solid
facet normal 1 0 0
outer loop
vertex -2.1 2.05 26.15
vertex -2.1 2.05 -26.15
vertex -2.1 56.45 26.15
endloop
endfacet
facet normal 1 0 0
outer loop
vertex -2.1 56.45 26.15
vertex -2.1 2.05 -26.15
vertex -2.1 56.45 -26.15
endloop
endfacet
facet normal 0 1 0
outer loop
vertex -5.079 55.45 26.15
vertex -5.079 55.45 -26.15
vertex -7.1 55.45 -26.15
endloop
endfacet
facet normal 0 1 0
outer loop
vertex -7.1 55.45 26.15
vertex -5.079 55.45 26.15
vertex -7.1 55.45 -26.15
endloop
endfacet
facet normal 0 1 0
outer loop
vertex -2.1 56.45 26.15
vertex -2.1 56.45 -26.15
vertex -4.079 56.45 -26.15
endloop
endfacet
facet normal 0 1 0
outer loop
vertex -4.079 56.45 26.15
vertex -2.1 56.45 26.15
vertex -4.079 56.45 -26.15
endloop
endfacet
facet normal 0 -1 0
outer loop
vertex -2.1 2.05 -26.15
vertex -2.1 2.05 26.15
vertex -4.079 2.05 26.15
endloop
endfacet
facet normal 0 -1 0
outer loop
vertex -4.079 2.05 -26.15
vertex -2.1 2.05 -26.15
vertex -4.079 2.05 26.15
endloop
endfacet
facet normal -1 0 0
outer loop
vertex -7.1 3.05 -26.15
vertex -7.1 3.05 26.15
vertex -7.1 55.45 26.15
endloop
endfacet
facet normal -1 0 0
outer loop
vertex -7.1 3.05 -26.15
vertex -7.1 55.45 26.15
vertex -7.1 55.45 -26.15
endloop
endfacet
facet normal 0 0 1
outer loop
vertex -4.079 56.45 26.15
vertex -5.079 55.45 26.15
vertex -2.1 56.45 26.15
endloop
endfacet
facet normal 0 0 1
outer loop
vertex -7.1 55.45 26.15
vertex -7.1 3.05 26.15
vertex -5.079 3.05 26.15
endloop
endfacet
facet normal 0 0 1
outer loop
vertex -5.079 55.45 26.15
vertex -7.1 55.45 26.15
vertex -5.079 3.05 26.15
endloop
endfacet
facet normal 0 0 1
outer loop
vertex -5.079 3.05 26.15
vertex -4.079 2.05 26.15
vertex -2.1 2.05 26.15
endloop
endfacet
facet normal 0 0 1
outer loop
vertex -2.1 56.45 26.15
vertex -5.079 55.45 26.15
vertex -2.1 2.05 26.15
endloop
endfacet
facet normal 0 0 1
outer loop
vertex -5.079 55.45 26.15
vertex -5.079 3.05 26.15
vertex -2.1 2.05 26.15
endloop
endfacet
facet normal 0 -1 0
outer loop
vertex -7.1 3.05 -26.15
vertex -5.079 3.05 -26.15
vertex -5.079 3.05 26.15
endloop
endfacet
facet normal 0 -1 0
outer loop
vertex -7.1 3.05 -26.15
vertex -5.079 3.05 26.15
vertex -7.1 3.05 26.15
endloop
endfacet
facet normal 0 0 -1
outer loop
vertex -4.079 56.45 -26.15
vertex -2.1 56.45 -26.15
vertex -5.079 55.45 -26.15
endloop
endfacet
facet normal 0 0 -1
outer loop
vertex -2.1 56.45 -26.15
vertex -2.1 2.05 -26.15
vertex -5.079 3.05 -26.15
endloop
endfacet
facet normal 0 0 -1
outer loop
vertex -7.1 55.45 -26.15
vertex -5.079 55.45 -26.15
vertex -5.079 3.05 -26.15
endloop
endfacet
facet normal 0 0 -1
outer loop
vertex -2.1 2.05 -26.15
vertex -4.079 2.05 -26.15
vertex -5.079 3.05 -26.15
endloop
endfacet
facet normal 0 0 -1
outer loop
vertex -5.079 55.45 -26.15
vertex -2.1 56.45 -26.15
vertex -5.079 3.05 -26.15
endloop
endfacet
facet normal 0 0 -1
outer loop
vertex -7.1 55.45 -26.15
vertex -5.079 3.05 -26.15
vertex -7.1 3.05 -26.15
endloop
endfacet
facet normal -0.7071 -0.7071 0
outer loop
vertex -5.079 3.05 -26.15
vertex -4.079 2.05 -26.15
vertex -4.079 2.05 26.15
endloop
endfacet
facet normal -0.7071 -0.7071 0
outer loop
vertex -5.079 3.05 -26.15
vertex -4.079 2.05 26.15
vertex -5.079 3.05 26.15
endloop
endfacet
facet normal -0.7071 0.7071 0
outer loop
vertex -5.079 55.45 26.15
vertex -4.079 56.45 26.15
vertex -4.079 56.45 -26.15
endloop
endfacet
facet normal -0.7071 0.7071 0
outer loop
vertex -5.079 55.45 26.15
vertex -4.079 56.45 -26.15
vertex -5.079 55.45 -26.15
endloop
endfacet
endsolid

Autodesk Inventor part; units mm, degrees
ref_plane "YZ Plane" through (0, 0, 0) normal (1, 0, 0) x (0, 1, 0)
ref_plane "XZ Plane" through (0, 0, 0) normal (0, 1, 0) x (-1, 0, 0)
ref_plane "XY Plane" through (0, 0, 0) normal (0, 0, 1) x (1, 0, 0)
sketch "Sketch1" plane through (0, 0, 0) normal (0, 1, 0) x (-1, 0, 0)
  line L0 (-20, -25) -> (20, -25) construction
  line L1 (20, -25) -> (20, 25) construction
  line L2 (20, 25) -> (-20, 25) construction
  line L3 (-20, 25) -> (-20, -25) construction
  line L4 (-20, -25) -> (20, 25) construction
  line L5 (20, -25) -> (-20, 25) construction
  line L6 (25, 30) -> (25, -30)
  line L7 (25, -30) -> (-25, -30)
  line L8 (-25, -30) -> (-25, 30)
  line L9 (-25, 30) -> (25, 30)
  point P0 (0, 0)
  dimension "d0" = 50
  dimension "d1" = 40
  dimension "d2" = 5
sketch "Sketch2" plane through (0, 0, 0) normal (0, 1, 0) x (-1, 0, 0)
  line L0 (-20, -25) -> (20, -25) construction
  line L1 (20, -25) -> (20, 25) construction
  line L2 (20, 25) -> (-20, 25) construction
  line L3 (-20, 25) -> (-20, -25) construction
  line L4 (-20, -25) -> (20, 25) construction
  line L5 (20, -25) -> (-20, 25) construction
  line L6 (25, 30) -> (25, -30) projected
  line L7 (25, -30) -> (-25, -30) projected
  line L8 (-25, -30) -> (-25, 30) projected
  line L9 (-25, 30) -> (25, 30) projected
  point P0 (0, 0)
  point P1 (0, 0)
extrude "Extrusion1" add sketch "Sketch1" against normal blind 3
hole "Hole1" at (20, 0, -25) at (-20, 0, 25) at (-20, 0, -25) at (20, 0, 25) direction (0, -1, 0) diameter 3.4 end through all clearance for "Socket Head Cap Screw ISO 4762" size "M3" standard "ISO"
fillet "Fillet1" radius 2 4 edges at (25, -1.5, 30) (-25, -1.5, 30) (25, -1.5, -30) (-25, -1.5, -30)
sketch "Sketch3" plane through (0, 0, 0) normal (0, 1, 0) x (1, 0, 0)
  circle A0 centre (4.95, 16.1) radius 7.05
  line L0 (4.95, 37.6221) -> (4.95, -37.6221) construction
  circle A1 centre (4.95, 0) radius 7.05
  circle A2 centre (4.95, -16.1) radius 7.05
  line L1 (15, -26.15) -> (-5.1, -26.15)
  line L2 (-5.1, -26.15) -> (-5.1, 26.15)
  line L3 (-5.1, 26.15) -> (15, 26.15)
  line L4 (15, 26.15) -> (15, -26.15)
  line L5 (15, -26.15) -> (-5.1, 26.15) construction
  line L6 (-5.1, -26.15) -> (15, 26.15) construction
  line L7 (35, 0) -> (-35, 0) projected
  line L8 (25, -28) -> (25, 28) projected
  line L9 (4.95, 23.15) -> (-5.1, 23.15)
  line L10 (4.95, 9.05) -> (-5.1, 9.05)
  line L11 (4.95, 7.05) -> (-5.1, 7.05)
  line L12 (4.95, -7.05) -> (-5.3479, -7.05)
  line L13 (4.95, -9.05) -> (-5.1, -9.05)
  line L14 (4.95, -23.15) -> (-5.1, -23.15)
  point P0 (4.95, 26.15)
  point P1 (-5.1, -7.05)
  dimension "d15" = 14.1
  dimension "d16" = 14.1
  dimension "d17" = 14.1
  dimension "d18" = 16.1
  dimension "d19" = 16.1
  dimension "d20" = 10.05
  dimension "d21" = 10.05
  dimension "d60" = 10
extrude "Extrusion2" add sketch "Sketch3" along normal blind 50.5 contours A0 L9 L2 L3 L4 L7 A1 L11 L10 | L4 L1 L2 L14 A2 L13 L12 A1 L7
sketch "Sketch4" plane through (0, -3, 0) normal (0, -1, 0) x (1, 0, 0)
  line L0 (15, -26.15) -> (-5.1, -26.15) projected
  line L1 (-5.1, -26.15) -> (-5.1, -23.15) projected
  line L2 (-5.1, 26.15) -> (15, 26.15) projected
  line L3 (15, 26.15) -> (15, -26.15) projected
  arc A0 (4.95, 9.05) -> (4.95, 23.15) centre (4.95, 16.1) ccw projected
  arc A1 (4.95, -7.05) -> (4.95, 7.05) centre (4.95, 0) ccw projected
  arc A2 (4.95, -23.15) -> (4.95, -9.05) centre (4.95, -16.1) ccw projected
  circle A3 centre (4.95, -16.1) radius 1
  circle A4 centre (4.95, 16.1) radius 1
  line L4 (-5.1, -23.15) -> (4.95, -23.15) projected
  line L5 (4.95, -9.05) -> (-5.1, -9.05) projected
  line L6 (-5.1, -9.05) -> (-5.1, -7.05) projected
  line L7 (-5.1, -7.05) -> (4.95, -7.05) projected
  line L8 (4.95, 7.05) -> (-5.1, 7.05) projected
  line L9 (-5.1, 7.05) -> (-5.1, 9.05) projected
  line L10 (-5.1, 9.05) -> (4.95, 9.05) projected
  line L11 (4.95, 23.15) -> (-5.1, 23.15) projected
  line L12 (-5.1, 23.15) -> (-5.1, 26.15) projected
  point P0 (0, 0)
  dimension "d24" = 2
  dimension "d25" = 2
sketch "Sketch5" plane through (4.95, 0, -16.1) normal (0, 1, 0) x (0, 0, -1)
  line L0 (10.05, -10.05) -> (10.05, 10.05) projected
  line L1 (10.05, 10.05) -> (7.05, 10.05) projected
  line L2 (-42.25, 10.05) -> (-42.25, -10.05) projected
  line L3 (-42.25, -10.05) -> (10.05, -10.05) projected
  arc A0 (-39.25, 0) -> (-25.15, 0) centre (-32.2, 0) ccw projected
  arc A1 (-23.15, 0) -> (-9.05, 0) centre (-16.1, 0) ccw projected
  arc A2 (-7.05, 0) -> (7.05, 0) centre (0, 0) ccw projected
  circle A3 centre (0, 0) radius 2.5
  line L4 (7.05, 10.05) -> (7.05, 0) projected
  line L5 (-7.05, 0) -> (-7.05, 10.05) projected
  line L6 (-7.05, 10.05) -> (-9.05, 10.05) projected
  line L7 (-9.05, 10.05) -> (-9.05, 0) projected
  line L8 (-23.15, 0) -> (-23.15, 10.05) projected
  line L9 (-23.15, 10.05) -> (-25.15, 10.05) projected
  line L10 (-25.15, 10.05) -> (-25.15, 0) projected
  line L11 (-39.25, 0) -> (-39.25, 10.05) projected
  line L12 (-39.25, 10.05) -> (-42.25, 10.05) projected
  point P0 (-16.1, 4.95)
  dimension "d26" = 5
extrude "Extrusion3" cut sketch "Sketch5" against normal blind 1 contours A3
extrude "Extrusion4" cut sketch "Sketch4" against normal blind 2 contours A3
sketch "Sketch7" plane through (0, 50.5, 0) normal (0, 1, 0) x (1, 0, 0)
  line L0 (15, 26.15) -> (-5.1, 26.15) projected
  line L1 (-5.1, 26.15) -> (-5.1, 23.15) projected
  line L2 (-5.1, -26.15) -> (15, -26.15) projected
  line L3 (15, -26.15) -> (15, 26.15) projected
  arc A0 (4.95, -23.15) -> (4.95, -9.05) centre (4.95, -16.1) ccw construction
  arc A1 (4.95, -7.05) -> (4.95, 7.05) centre (4.95, 0) ccw construction
  arc A2 (4.95, 9.05) -> (4.95, 23.15) centre (4.95, 16.1) ccw construction
  line L4 (-5.1, 23.15) -> (4.95, 23.15) projected
  line L5 (4.95, 9.05) -> (-5.1, 9.05) projected
  line L6 (-5.1, 9.05) -> (-5.1, 7.05) projected
  line L7 (-5.1, 7.05) -> (4.95, 7.05) projected
  line L8 (4.95, -7.05) -> (-5.1, -7.05) projected
  line L9 (-5.1, -7.05) -> (-5.1, -9.05) projected
  line L10 (-5.1, -9.05) -> (4.95, -9.05) projected
  line L11 (4.95, -23.15) -> (-5.1, -23.15) projected
  line L12 (-5.1, -23.15) -> (-5.1, -26.15) projected
  line L13 (-5.1, 26.15) -> (15, 26.15)
  line L14 (15, 26.15) -> (15, -26.15)
  line L15 (15, -26.15) -> (-5.1, -26.15)
  line L16 (-5.1, -26.15) -> (-5.1, 26.15)
  point P0 (0, 0)
  point P1 (-5.1, -23.15)
extrude "Extrusion5" add sketch "Sketch7" along normal blind 8
sketch "Sketch14" plane through (0, 50.5, 0) normal (0, -1, 0) x (1, 0, 0)
  line L0 (-5.1, -23.15) -> (4.95, -23.15) projected
  arc A0 (4.95, -23.15) -> (4.95, -9.05) centre (4.95, -16.1) ccw projected
  line L1 (4.95, -9.05) -> (-5.1, -9.05) projected
  line L2 (-5.1, -23.15) -> (-5.1, -9.05) projected
  line L3 (4.95, 7.05) -> (-5.1, 7.05) projected
  line L4 (-5.1, -7.05) -> (-5.1, 7.05) projected
  line L5 (-5.1, -7.05) -> (4.95, -7.05) projected
  arc A1 (4.95, -7.05) -> (4.95, 7.05) centre (4.95, 0) ccw projected
  line L6 (4.95, 23.15) -> (-5.1, 23.15) projected
  line L7 (-5.1, 9.05) -> (-5.1, 23.15) projected
  line L8 (-5.1, 9.05) -> (4.95, 9.05) projected
  arc A2 (4.95, 9.05) -> (4.95, 23.15) centre (4.95, 16.1) ccw projected
  circle A3 centre (4.95, -16.1) radius 2.5
  circle A4 centre (4.95, 0) radius 2.5
  circle A5 centre (4.95, 16.1) radius 2.5
  point P0 (0, 0)
  dimension "d66" = 5
  dimension "d67" = 5
  dimension "d68" = 5
extrude "Extrusion10" cut sketch "Sketch14" against normal blind 1 contours A3 | A4 | A5
sketch "Sketch15" plane through (4.95, 51.5, -16.1) normal (0, -1, 0) x (1, 0, 0)
  circle A0 centre (0, 0) radius 2.5 construction
  circle A1 centre (0, 16.1) radius 2.5 construction
  line L0 (-2.5, 0) -> (-2.5, 16.1)
  line L1 (2.5, 16.1) -> (2.5, 0)
  line L2 (0, 0) -> (0, 16.1) construction
  line L3 (2.5, 0) -> (-2.5, 0)
  line L4 (2.5, 16.1) -> (-2.5, 16.1)
  point P0 (-4.95, 16.1)
extrude "Extrusion11" cut sketch "Sketch15" against normal blind 2
chamfer "Chamfer1" distance 2 angle 45 2 edges at (4.95, 51.5, 0) (4.95, 51.5, -16.1)
sketch "Sketch16" plane through (0, 0, 0) normal (0, 1, 0) x (1, 0, 0)
  circle A0 centre (4.95, 16.1) radius 2.5 projected
  line L0 (-5.1, 26.15) -> (15, 26.15) projected
  line L1 (15, 26.15) -> (15, -26.15) projected
  line L2 (15, -26.15) -> (-5.1, -26.15) projected
  line L3 (-5.1, -26.15) -> (-5.1, -23.15) projected
  line L4 (-5.1, -23.15) -> (4.95, -23.15) projected
  arc A1 (4.95, -23.15) -> (4.95, -9.05) centre (4.95, -16.1) ccw projected
  line L5 (4.95, -9.05) -> (-5.1, -9.05) projected
  line L6 (-5.1, -9.05) -> (-5.1, -7.05) projected
  line L7 (-5.1, -7.05) -> (4.95, -7.05) projected
  arc A2 (4.95, -7.05) -> (4.95, 7.05) centre (4.95, 0) ccw projected
  line L8 (4.95, 7.05) -> (-5.1, 7.05) projected
  line L9 (-5.1, 7.05) -> (-5.1, 9.05) projected
  line L10 (-5.1, 9.05) -> (4.95, 9.05) projected
  arc A3 (4.95, 9.05) -> (4.95, 23.15) centre (4.95, 16.1) ccw projected
  line L11 (4.95, 23.15) -> (-5.1, 23.15) projected
  line L12 (-5.1, 23.15) -> (-5.1, 26.15) projected
  circle A4 centre (20, -25) radius 1.7 projected
  circle A5 centre (-20, 25) radius 1.7 projected
  circle A6 centre (-20, -25) radius 1.7 projected
  circle A7 centre (20, 25) radius 1.7 projected
  arc A8 (-23, 30) -> (-25, 28) centre (-23, 28) ccw projected
  line L13 (-25, 28) -> (-25, -28) projected
  arc A9 (-25, -28) -> (-23, -30) centre (-23, -28) ccw projected
  line L14 (-23, -30) -> (23, -30) projected
  arc A10 (23, -30) -> (25, -28) centre (23, -28) ccw projected
  line L15 (25, -28) -> (25, 28) projected
  arc A11 (25, 28) -> (23, 30) centre (23, 28) ccw projected
  line L16 (23, 30) -> (-23, 30) projected
  circle A12 centre (4.95, 0) radius 2.5
  circle A13 centre (4.95, -16.1) radius 2.5
  line L17 (5.95, -2.2913) -> (5.95, -13.8087)
  line L18 (3.95, -13.8087) -> (3.95, -2.2913)
  line L19 (4.95, 0) -> (4.95, -16.1) construction
  point P0 (0, 0)
  dimension "d76" = 5
  dimension "d77" = 5
  dimension "d78" = 2
  dimension "d79" = 1
extrude "Extrusion12" cut sketch "Sketch16" against normal blind 1 contours L17 A13 L18 L5 A1 | A1 L5 L18 L7 A2 L17 | A2 L7 L18 A12 L17 | A13 | A12
sketch "Sketch17" plane through (4.95, 51.5, 16.1) normal (0, -1, 0) x (1, 0, 0)
  circle A0 centre (0, -32.2) radius 1 projected
  arc A1 (-29.95, -44.1) -> (-27.95, -46.1) centre (-27.95, -44.1) ccw projected
  line L0 (-27.95, -46.1) -> (18.05, -46.1) projected
  arc A2 (18.05, -46.1) -> (20.05, -44.1) centre (18.05, -44.1) ccw projected
  line L1 (20.05, -44.1) -> (20.05, 11.9) projected
  arc A3 (20.05, 11.9) -> (18.05, 13.9) centre (18.05, 11.9) ccw projected
  line L2 (18.05, 13.9) -> (-27.95, 13.9) projected
  arc A4 (-27.95, 13.9) -> (-29.95, 11.9) centre (-27.95, 11.9) ccw projected
  line L3 (-29.95, 11.9) -> (-29.95, -44.1) projected
  circle A5 centre (15.05, 8.9) radius 1.7 projected
  circle A6 centre (-24.95, -41.1) radius 1.7 projected
  circle A7 centre (-24.95, 8.9) radius 1.7 projected
  circle A8 centre (15.05, -41.1) radius 1.7 projected
  circle A9 centre (0, -16.1) radius 2.5 projected
  circle A10 centre (0, 0) radius 2.5 construction
  line L4 (0, 0) -> (7.05, -7.05) construction
  line L5 (-10.05, -7.05) -> (-10.05, 7.05) projected
  circle A11 centre (7.05, -7.05) radius 1.5
  line L6 (0, -7.05) -> (-1, -7.05) projected
  line L7 (-10.05, -7.05) -> (0, -7.05) projected
  line L8 (-1, -7.05) -> (-10.05, -7.05) projected
  arc A12 (1, -6.9787) -> (0, 7.05) centre (0, 0) ccw projected
  arc A13 (0, -7.05) -> (0, 7.05) centre (0, 0) ccw projected
  arc A14 (0, -7.05) -> (1, -6.9787) centre (0, 0) ccw projected
  line L9 (1, -13.8087) -> (1, -9.1213) projected
  arc A15 (0, -23.15) -> (1, -9.1213) centre (0, -16.1) ccw projected
  line L10 (0, -23.15) -> (-10.05, -23.15) projected
  line L11 (-10.05, -23.15) -> (-10.05, -25.15) projected
  line L12 (-10.05, -25.15) -> (0, -25.15) projected
  arc A16 (0, -39.25) -> (0, -25.15) centre (0, -32.2) ccw projected
  line L13 (0, -39.25) -> (-10.05, -39.25) projected
  line L14 (-10.05, -39.25) -> (-10.05, -42.25) projected
  line L15 (-10.05, -42.25) -> (10.05, -42.25) projected
  line L16 (10.05, -42.25) -> (10.05, 10.05) projected
  line L17 (10.05, 10.05) -> (-10.05, 10.05) projected
  line L18 (-10.05, 10.05) -> (-10.05, 7.05) projected
  line L19 (-10.05, 7.05) -> (0, 7.05) projected
  arc A17 (1, -6.9787) -> (0, 7.05) centre (0, 0) ccw projected
  line L20 (1, -6.9787) -> (1, -2.2913) projected
  arc A18 (1, -2.2913) -> (-1, -2.2913) centre (0, 0) ccw projected
  line L21 (-1, -2.2913) -> (-1, -7.05) projected
  line L22 (-1, -7.05) -> (-10.05, -7.05) projected
  line L23 (-10.05, -7.05) -> (-10.05, -9.05) projected
  line L24 (-10.05, -9.05) -> (-1, -9.05) projected
  line L25 (-1, -9.05) -> (-1, -13.8087) projected
  arc A19 (-1, -13.8087) -> (1, -13.8087) centre (0, -16.1) ccw projected
  circle A20 centre (0, -32.2) radius 2.5 projected
  circle A21 centre (15.05, 8.9) radius 1.7 projected
  circle A22 centre (-24.95, -41.1) radius 1.7 projected
  circle A23 centre (-24.95, 8.9) radius 1.7 projected
  circle A24 centre (15.05, -41.1) radius 1.7 projected
  arc A25 (-29.95, -44.1) -> (-27.95, -46.1) centre (-27.95, -44.1) ccw projected
  line L26 (-29.95, -44.1) -> (-29.95, 11.9) projected
  arc A26 (-27.95, 13.9) -> (-29.95, 11.9) centre (-27.95, 11.9) ccw projected
  line L27 (-27.95, 13.9) -> (18.05, 13.9) projected
  arc A27 (20.05, 11.9) -> (18.05, 13.9) centre (18.05, 11.9) ccw projected
  line L28 (20.05, 11.9) -> (20.05, -44.1) projected
  arc A28 (18.05, -46.1) -> (20.05, -44.1) centre (18.05, -44.1) ccw projected
  line L29 (18.05, -46.1) -> (-27.95, -46.1) projected
  point P0 (-4.95, -16.1)
  dimension "d83" = 3
  dimension "d84" = 45
  dimension "d85" = 3
extrude "Extrusion13" cut sketch "Sketch17" along normal through all contours A11
sketch "Sketch18" plane through (4.95, 51.5, 16.1) normal (0, -1, 0) x (1, 0, 0)
  circle A0 centre (7.05, -7.05) radius 1.5 projected
  circle A1 centre (7.05, -7.05) radius 1.5 projected
  circle A2 centre (0, 0) radius 2.5 projected
  circle A3 centre (0, 0) radius 2.5 projected
  line L0 (7.05, -7.05) -> (0, 0) construction
  line L1 (8.1107, -5.9893) -> (2.4749, -0.3536)
  circle A4 centre (0, 0) radius 2.5 projected
  line L2 (0.3536, -2.4749) -> (5.9893, -8.1107)
  line L3 (0.3536, -2.4749) -> (2.4749, -0.3536)
  line L4 (8.1107, -5.9893) -> (5.9893, -8.1107)
  point P0 (-4.95, -16.1)
  point P1 (5.2928, -3.1714)
  point P2 (5.9893, -8.1107)
  dimension "d89" = 3
extrude "Extrusion14" cut sketch "Sketch18" against normal blind 2 contours L4 A0 | A0 L2 A2 L1 | A2 L3 picked at (6.5012, -6.2587) picked at (1.7238, -1.2336)
chamfer "Chamfer2" distance 2 angle 45 1 edges at (6.3642, 51.5, 14.6858)
chamfer "Chamfer3" distance 1.4 angle 45 1 edges at (12, 51.5, 9.05)
sketch "Sketch19" plane through (0, 0, 0) normal (0, 1, 0) x (1, 0, 0)
  line L0 (5.95, -2.2913) -> (5.95, -13.8087) projected
  arc A0 (5.95, -2.2913) -> (3.95, -2.2913) centre (4.95, 0) ccw projected
  line L1 (3.95, -13.8087) -> (3.95, -2.2913) projected
  arc A1 (3.95, -13.8087) -> (5.95, -13.8087) centre (4.95, -16.1) ccw projected
  circle A2 centre (4.95, -16.1) radius 7.05
  line L2 (-5.1, -9.05) -> (-5.1, -7.05) projected
  line L3 (-5.1, -23.15) -> (4.95, -23.15) projected
  line L4 (-5.1, -9.05) -> (-5.1, -23.15)
  point P0 (0, 0)
  dimension "d98" = 14.1
sketch "Sketch20" plane through (-5.1, 50.5, -23.15) normal (-1, 0, 0) x (0, 0, 1)
  line L0 (49.3, -50.5) -> (46.3, -50.5) projected
  line L1 (49.3, -50.5) -> (49.3, 8) projected
  line L2 (-3, 8) -> (49.3, 8) projected
  line L3 (-3, -50.5) -> (-3, 8) projected
  line L4 (0, -50.5) -> (-3, -50.5) projected
  line L5 (0, -50.5) -> (0, 0) projected
  line L6 (0, 0) -> (14.1, 0) projected
  line L7 (14.1, -50.5) -> (14.1, 0) projected
  line L8 (16.1, -50.5) -> (14.1, -50.5) projected
  line L9 (16.1, -50.5) -> (16.1, 0) projected
  line L10 (16.1, 0) -> (30.2, 0) projected
  line L11 (30.2, -50.5) -> (30.2, 0) projected
  line L12 (32.2, -50.5) -> (30.2, -50.5) projected
  line L13 (32.2, -50.5) -> (32.2, 0) projected
  line L14 (32.2, 0) -> (46.3, 0) projected
  line L15 (46.3, -50.5) -> (46.3, 0) projected
  point P0 (23.15, -50.5)
extrude "Extrusion15" add sketch "Sketch20" along normal blind 2
sketch "Sketch21" plane through (0, 0, 0) normal (0, 1, 0) x (1, 0, 0)
  line L0 (-7.1, -23.15) -> (4.95, -23.15) projected
  line L1 (-7.1, -23.15) -> (-7.1, 23.15)
  line L2 (-2.1, -23.15) -> (-2.1, 23.15)
  circle A0 centre (4.95, -16.1) radius 7.05 projected
  line L3 (4.95, 23.15) -> (-7.1, 23.15) projected
  point P0 (0, 0)
extrude "Extrusion16" add sketch "Sketch21" along normal blind 58.5 contours L1 L3 L2 L0
sketch "Sketch22" plane through (15, 0, 26.15) normal (0, 0, 1) x (1, 0, 0)
  line L0 (-22.1, 0) -> (-22.1, 58.5) projected
  line L1 (-22.1, 29.25) -> (0.0273, 29.25) construction
  line L2 (-22.1, 0) -> (-22.1, 3)
  line L3 (-22.1, 3) -> (-20.1, 3) construction
  line L4 (-20.1, 3) -> (-19.1, 2) construction
  line L5 (-19.1, 2) -> (-17.1, 2) construction
  line L6 (-17.1, 2) -> (-17.1, 0)
  line L7 (-11.05, 0) -> (-17.1, 0) projected
  line L8 (-38, 0) -> (8, 0) projected
  line L9 (-22.1, 58.5) -> (-22.1, 0)
  line L10 (-22.1, 58.5) -> (-22.1, 55.5)
  line L11 (-22.1, 55.5) -> (-20.1, 55.5) construction
  line L12 (-20.1, 55.5) -> (-19.1, 56.5) construction
  line L13 (-19.1, 56.5) -> (-17.1, 56.5) construction
  line L14 (-17.1, 56.5) -> (-17.1, 58.5)
  line L15 (-11.05, 58.5) -> (-17.1, 58.5)
  line L16 (-17.1, 2) -> (-17.1, 56.5)
  line L17 (-61.1197, 77.7276) -> (44.0103, 77.7276)
  line L18 (44.0103, 77.7276) -> (44.0103, -41.1524)
  line L19 (44.0103, -41.1524) -> (-61.1197, -41.1524)
  line L20 (-61.1197, -41.1524) -> (-61.1197, 77.7276)
  line L21 (-17.1, 56.45) -> (-19.0793, 56.45)
  line L22 (-19.0793, 56.45) -> (-20.0793, 55.45)
  line L23 (-20.0793, 55.45) -> (-22.1, 55.45)
  line L24 (-17.1, 2.05) -> (-19.0793, 2.05)
  line L25 (-19.0793, 2.05) -> (-20.0793, 3.05)
  line L26 (-20.0793, 3.05) -> (-22.1, 3.05)
  point P0 (-15, 0)
  point P1 (-15, 58.5)
  dimension "d104" = 3
  dimension "d105" = 2
  dimension "d106" = 2
  dimension "d107" = 45
  dimension "d108" = 5
  dimension "d111" = 0.05
  dimension "d112" = 0.05
  dimension "d113" = 0.05
  dimension "d114" = 0.05
  dimension "d115" = 0.05
  dimension "d116" = 0.05
extrude "Extrusion17" cut sketch "Sketch22" along normal through all both and the other way through all contours L0 L26 L25 L24 L16 L6 L8 | L17 L18 L19 L20
equation "\"d16\" = d15"
equation "\"d17\" = d15"
equation "\"d19\" = d18"
equation "\"d21\" = d20"
properties part number "battery holder lid"
